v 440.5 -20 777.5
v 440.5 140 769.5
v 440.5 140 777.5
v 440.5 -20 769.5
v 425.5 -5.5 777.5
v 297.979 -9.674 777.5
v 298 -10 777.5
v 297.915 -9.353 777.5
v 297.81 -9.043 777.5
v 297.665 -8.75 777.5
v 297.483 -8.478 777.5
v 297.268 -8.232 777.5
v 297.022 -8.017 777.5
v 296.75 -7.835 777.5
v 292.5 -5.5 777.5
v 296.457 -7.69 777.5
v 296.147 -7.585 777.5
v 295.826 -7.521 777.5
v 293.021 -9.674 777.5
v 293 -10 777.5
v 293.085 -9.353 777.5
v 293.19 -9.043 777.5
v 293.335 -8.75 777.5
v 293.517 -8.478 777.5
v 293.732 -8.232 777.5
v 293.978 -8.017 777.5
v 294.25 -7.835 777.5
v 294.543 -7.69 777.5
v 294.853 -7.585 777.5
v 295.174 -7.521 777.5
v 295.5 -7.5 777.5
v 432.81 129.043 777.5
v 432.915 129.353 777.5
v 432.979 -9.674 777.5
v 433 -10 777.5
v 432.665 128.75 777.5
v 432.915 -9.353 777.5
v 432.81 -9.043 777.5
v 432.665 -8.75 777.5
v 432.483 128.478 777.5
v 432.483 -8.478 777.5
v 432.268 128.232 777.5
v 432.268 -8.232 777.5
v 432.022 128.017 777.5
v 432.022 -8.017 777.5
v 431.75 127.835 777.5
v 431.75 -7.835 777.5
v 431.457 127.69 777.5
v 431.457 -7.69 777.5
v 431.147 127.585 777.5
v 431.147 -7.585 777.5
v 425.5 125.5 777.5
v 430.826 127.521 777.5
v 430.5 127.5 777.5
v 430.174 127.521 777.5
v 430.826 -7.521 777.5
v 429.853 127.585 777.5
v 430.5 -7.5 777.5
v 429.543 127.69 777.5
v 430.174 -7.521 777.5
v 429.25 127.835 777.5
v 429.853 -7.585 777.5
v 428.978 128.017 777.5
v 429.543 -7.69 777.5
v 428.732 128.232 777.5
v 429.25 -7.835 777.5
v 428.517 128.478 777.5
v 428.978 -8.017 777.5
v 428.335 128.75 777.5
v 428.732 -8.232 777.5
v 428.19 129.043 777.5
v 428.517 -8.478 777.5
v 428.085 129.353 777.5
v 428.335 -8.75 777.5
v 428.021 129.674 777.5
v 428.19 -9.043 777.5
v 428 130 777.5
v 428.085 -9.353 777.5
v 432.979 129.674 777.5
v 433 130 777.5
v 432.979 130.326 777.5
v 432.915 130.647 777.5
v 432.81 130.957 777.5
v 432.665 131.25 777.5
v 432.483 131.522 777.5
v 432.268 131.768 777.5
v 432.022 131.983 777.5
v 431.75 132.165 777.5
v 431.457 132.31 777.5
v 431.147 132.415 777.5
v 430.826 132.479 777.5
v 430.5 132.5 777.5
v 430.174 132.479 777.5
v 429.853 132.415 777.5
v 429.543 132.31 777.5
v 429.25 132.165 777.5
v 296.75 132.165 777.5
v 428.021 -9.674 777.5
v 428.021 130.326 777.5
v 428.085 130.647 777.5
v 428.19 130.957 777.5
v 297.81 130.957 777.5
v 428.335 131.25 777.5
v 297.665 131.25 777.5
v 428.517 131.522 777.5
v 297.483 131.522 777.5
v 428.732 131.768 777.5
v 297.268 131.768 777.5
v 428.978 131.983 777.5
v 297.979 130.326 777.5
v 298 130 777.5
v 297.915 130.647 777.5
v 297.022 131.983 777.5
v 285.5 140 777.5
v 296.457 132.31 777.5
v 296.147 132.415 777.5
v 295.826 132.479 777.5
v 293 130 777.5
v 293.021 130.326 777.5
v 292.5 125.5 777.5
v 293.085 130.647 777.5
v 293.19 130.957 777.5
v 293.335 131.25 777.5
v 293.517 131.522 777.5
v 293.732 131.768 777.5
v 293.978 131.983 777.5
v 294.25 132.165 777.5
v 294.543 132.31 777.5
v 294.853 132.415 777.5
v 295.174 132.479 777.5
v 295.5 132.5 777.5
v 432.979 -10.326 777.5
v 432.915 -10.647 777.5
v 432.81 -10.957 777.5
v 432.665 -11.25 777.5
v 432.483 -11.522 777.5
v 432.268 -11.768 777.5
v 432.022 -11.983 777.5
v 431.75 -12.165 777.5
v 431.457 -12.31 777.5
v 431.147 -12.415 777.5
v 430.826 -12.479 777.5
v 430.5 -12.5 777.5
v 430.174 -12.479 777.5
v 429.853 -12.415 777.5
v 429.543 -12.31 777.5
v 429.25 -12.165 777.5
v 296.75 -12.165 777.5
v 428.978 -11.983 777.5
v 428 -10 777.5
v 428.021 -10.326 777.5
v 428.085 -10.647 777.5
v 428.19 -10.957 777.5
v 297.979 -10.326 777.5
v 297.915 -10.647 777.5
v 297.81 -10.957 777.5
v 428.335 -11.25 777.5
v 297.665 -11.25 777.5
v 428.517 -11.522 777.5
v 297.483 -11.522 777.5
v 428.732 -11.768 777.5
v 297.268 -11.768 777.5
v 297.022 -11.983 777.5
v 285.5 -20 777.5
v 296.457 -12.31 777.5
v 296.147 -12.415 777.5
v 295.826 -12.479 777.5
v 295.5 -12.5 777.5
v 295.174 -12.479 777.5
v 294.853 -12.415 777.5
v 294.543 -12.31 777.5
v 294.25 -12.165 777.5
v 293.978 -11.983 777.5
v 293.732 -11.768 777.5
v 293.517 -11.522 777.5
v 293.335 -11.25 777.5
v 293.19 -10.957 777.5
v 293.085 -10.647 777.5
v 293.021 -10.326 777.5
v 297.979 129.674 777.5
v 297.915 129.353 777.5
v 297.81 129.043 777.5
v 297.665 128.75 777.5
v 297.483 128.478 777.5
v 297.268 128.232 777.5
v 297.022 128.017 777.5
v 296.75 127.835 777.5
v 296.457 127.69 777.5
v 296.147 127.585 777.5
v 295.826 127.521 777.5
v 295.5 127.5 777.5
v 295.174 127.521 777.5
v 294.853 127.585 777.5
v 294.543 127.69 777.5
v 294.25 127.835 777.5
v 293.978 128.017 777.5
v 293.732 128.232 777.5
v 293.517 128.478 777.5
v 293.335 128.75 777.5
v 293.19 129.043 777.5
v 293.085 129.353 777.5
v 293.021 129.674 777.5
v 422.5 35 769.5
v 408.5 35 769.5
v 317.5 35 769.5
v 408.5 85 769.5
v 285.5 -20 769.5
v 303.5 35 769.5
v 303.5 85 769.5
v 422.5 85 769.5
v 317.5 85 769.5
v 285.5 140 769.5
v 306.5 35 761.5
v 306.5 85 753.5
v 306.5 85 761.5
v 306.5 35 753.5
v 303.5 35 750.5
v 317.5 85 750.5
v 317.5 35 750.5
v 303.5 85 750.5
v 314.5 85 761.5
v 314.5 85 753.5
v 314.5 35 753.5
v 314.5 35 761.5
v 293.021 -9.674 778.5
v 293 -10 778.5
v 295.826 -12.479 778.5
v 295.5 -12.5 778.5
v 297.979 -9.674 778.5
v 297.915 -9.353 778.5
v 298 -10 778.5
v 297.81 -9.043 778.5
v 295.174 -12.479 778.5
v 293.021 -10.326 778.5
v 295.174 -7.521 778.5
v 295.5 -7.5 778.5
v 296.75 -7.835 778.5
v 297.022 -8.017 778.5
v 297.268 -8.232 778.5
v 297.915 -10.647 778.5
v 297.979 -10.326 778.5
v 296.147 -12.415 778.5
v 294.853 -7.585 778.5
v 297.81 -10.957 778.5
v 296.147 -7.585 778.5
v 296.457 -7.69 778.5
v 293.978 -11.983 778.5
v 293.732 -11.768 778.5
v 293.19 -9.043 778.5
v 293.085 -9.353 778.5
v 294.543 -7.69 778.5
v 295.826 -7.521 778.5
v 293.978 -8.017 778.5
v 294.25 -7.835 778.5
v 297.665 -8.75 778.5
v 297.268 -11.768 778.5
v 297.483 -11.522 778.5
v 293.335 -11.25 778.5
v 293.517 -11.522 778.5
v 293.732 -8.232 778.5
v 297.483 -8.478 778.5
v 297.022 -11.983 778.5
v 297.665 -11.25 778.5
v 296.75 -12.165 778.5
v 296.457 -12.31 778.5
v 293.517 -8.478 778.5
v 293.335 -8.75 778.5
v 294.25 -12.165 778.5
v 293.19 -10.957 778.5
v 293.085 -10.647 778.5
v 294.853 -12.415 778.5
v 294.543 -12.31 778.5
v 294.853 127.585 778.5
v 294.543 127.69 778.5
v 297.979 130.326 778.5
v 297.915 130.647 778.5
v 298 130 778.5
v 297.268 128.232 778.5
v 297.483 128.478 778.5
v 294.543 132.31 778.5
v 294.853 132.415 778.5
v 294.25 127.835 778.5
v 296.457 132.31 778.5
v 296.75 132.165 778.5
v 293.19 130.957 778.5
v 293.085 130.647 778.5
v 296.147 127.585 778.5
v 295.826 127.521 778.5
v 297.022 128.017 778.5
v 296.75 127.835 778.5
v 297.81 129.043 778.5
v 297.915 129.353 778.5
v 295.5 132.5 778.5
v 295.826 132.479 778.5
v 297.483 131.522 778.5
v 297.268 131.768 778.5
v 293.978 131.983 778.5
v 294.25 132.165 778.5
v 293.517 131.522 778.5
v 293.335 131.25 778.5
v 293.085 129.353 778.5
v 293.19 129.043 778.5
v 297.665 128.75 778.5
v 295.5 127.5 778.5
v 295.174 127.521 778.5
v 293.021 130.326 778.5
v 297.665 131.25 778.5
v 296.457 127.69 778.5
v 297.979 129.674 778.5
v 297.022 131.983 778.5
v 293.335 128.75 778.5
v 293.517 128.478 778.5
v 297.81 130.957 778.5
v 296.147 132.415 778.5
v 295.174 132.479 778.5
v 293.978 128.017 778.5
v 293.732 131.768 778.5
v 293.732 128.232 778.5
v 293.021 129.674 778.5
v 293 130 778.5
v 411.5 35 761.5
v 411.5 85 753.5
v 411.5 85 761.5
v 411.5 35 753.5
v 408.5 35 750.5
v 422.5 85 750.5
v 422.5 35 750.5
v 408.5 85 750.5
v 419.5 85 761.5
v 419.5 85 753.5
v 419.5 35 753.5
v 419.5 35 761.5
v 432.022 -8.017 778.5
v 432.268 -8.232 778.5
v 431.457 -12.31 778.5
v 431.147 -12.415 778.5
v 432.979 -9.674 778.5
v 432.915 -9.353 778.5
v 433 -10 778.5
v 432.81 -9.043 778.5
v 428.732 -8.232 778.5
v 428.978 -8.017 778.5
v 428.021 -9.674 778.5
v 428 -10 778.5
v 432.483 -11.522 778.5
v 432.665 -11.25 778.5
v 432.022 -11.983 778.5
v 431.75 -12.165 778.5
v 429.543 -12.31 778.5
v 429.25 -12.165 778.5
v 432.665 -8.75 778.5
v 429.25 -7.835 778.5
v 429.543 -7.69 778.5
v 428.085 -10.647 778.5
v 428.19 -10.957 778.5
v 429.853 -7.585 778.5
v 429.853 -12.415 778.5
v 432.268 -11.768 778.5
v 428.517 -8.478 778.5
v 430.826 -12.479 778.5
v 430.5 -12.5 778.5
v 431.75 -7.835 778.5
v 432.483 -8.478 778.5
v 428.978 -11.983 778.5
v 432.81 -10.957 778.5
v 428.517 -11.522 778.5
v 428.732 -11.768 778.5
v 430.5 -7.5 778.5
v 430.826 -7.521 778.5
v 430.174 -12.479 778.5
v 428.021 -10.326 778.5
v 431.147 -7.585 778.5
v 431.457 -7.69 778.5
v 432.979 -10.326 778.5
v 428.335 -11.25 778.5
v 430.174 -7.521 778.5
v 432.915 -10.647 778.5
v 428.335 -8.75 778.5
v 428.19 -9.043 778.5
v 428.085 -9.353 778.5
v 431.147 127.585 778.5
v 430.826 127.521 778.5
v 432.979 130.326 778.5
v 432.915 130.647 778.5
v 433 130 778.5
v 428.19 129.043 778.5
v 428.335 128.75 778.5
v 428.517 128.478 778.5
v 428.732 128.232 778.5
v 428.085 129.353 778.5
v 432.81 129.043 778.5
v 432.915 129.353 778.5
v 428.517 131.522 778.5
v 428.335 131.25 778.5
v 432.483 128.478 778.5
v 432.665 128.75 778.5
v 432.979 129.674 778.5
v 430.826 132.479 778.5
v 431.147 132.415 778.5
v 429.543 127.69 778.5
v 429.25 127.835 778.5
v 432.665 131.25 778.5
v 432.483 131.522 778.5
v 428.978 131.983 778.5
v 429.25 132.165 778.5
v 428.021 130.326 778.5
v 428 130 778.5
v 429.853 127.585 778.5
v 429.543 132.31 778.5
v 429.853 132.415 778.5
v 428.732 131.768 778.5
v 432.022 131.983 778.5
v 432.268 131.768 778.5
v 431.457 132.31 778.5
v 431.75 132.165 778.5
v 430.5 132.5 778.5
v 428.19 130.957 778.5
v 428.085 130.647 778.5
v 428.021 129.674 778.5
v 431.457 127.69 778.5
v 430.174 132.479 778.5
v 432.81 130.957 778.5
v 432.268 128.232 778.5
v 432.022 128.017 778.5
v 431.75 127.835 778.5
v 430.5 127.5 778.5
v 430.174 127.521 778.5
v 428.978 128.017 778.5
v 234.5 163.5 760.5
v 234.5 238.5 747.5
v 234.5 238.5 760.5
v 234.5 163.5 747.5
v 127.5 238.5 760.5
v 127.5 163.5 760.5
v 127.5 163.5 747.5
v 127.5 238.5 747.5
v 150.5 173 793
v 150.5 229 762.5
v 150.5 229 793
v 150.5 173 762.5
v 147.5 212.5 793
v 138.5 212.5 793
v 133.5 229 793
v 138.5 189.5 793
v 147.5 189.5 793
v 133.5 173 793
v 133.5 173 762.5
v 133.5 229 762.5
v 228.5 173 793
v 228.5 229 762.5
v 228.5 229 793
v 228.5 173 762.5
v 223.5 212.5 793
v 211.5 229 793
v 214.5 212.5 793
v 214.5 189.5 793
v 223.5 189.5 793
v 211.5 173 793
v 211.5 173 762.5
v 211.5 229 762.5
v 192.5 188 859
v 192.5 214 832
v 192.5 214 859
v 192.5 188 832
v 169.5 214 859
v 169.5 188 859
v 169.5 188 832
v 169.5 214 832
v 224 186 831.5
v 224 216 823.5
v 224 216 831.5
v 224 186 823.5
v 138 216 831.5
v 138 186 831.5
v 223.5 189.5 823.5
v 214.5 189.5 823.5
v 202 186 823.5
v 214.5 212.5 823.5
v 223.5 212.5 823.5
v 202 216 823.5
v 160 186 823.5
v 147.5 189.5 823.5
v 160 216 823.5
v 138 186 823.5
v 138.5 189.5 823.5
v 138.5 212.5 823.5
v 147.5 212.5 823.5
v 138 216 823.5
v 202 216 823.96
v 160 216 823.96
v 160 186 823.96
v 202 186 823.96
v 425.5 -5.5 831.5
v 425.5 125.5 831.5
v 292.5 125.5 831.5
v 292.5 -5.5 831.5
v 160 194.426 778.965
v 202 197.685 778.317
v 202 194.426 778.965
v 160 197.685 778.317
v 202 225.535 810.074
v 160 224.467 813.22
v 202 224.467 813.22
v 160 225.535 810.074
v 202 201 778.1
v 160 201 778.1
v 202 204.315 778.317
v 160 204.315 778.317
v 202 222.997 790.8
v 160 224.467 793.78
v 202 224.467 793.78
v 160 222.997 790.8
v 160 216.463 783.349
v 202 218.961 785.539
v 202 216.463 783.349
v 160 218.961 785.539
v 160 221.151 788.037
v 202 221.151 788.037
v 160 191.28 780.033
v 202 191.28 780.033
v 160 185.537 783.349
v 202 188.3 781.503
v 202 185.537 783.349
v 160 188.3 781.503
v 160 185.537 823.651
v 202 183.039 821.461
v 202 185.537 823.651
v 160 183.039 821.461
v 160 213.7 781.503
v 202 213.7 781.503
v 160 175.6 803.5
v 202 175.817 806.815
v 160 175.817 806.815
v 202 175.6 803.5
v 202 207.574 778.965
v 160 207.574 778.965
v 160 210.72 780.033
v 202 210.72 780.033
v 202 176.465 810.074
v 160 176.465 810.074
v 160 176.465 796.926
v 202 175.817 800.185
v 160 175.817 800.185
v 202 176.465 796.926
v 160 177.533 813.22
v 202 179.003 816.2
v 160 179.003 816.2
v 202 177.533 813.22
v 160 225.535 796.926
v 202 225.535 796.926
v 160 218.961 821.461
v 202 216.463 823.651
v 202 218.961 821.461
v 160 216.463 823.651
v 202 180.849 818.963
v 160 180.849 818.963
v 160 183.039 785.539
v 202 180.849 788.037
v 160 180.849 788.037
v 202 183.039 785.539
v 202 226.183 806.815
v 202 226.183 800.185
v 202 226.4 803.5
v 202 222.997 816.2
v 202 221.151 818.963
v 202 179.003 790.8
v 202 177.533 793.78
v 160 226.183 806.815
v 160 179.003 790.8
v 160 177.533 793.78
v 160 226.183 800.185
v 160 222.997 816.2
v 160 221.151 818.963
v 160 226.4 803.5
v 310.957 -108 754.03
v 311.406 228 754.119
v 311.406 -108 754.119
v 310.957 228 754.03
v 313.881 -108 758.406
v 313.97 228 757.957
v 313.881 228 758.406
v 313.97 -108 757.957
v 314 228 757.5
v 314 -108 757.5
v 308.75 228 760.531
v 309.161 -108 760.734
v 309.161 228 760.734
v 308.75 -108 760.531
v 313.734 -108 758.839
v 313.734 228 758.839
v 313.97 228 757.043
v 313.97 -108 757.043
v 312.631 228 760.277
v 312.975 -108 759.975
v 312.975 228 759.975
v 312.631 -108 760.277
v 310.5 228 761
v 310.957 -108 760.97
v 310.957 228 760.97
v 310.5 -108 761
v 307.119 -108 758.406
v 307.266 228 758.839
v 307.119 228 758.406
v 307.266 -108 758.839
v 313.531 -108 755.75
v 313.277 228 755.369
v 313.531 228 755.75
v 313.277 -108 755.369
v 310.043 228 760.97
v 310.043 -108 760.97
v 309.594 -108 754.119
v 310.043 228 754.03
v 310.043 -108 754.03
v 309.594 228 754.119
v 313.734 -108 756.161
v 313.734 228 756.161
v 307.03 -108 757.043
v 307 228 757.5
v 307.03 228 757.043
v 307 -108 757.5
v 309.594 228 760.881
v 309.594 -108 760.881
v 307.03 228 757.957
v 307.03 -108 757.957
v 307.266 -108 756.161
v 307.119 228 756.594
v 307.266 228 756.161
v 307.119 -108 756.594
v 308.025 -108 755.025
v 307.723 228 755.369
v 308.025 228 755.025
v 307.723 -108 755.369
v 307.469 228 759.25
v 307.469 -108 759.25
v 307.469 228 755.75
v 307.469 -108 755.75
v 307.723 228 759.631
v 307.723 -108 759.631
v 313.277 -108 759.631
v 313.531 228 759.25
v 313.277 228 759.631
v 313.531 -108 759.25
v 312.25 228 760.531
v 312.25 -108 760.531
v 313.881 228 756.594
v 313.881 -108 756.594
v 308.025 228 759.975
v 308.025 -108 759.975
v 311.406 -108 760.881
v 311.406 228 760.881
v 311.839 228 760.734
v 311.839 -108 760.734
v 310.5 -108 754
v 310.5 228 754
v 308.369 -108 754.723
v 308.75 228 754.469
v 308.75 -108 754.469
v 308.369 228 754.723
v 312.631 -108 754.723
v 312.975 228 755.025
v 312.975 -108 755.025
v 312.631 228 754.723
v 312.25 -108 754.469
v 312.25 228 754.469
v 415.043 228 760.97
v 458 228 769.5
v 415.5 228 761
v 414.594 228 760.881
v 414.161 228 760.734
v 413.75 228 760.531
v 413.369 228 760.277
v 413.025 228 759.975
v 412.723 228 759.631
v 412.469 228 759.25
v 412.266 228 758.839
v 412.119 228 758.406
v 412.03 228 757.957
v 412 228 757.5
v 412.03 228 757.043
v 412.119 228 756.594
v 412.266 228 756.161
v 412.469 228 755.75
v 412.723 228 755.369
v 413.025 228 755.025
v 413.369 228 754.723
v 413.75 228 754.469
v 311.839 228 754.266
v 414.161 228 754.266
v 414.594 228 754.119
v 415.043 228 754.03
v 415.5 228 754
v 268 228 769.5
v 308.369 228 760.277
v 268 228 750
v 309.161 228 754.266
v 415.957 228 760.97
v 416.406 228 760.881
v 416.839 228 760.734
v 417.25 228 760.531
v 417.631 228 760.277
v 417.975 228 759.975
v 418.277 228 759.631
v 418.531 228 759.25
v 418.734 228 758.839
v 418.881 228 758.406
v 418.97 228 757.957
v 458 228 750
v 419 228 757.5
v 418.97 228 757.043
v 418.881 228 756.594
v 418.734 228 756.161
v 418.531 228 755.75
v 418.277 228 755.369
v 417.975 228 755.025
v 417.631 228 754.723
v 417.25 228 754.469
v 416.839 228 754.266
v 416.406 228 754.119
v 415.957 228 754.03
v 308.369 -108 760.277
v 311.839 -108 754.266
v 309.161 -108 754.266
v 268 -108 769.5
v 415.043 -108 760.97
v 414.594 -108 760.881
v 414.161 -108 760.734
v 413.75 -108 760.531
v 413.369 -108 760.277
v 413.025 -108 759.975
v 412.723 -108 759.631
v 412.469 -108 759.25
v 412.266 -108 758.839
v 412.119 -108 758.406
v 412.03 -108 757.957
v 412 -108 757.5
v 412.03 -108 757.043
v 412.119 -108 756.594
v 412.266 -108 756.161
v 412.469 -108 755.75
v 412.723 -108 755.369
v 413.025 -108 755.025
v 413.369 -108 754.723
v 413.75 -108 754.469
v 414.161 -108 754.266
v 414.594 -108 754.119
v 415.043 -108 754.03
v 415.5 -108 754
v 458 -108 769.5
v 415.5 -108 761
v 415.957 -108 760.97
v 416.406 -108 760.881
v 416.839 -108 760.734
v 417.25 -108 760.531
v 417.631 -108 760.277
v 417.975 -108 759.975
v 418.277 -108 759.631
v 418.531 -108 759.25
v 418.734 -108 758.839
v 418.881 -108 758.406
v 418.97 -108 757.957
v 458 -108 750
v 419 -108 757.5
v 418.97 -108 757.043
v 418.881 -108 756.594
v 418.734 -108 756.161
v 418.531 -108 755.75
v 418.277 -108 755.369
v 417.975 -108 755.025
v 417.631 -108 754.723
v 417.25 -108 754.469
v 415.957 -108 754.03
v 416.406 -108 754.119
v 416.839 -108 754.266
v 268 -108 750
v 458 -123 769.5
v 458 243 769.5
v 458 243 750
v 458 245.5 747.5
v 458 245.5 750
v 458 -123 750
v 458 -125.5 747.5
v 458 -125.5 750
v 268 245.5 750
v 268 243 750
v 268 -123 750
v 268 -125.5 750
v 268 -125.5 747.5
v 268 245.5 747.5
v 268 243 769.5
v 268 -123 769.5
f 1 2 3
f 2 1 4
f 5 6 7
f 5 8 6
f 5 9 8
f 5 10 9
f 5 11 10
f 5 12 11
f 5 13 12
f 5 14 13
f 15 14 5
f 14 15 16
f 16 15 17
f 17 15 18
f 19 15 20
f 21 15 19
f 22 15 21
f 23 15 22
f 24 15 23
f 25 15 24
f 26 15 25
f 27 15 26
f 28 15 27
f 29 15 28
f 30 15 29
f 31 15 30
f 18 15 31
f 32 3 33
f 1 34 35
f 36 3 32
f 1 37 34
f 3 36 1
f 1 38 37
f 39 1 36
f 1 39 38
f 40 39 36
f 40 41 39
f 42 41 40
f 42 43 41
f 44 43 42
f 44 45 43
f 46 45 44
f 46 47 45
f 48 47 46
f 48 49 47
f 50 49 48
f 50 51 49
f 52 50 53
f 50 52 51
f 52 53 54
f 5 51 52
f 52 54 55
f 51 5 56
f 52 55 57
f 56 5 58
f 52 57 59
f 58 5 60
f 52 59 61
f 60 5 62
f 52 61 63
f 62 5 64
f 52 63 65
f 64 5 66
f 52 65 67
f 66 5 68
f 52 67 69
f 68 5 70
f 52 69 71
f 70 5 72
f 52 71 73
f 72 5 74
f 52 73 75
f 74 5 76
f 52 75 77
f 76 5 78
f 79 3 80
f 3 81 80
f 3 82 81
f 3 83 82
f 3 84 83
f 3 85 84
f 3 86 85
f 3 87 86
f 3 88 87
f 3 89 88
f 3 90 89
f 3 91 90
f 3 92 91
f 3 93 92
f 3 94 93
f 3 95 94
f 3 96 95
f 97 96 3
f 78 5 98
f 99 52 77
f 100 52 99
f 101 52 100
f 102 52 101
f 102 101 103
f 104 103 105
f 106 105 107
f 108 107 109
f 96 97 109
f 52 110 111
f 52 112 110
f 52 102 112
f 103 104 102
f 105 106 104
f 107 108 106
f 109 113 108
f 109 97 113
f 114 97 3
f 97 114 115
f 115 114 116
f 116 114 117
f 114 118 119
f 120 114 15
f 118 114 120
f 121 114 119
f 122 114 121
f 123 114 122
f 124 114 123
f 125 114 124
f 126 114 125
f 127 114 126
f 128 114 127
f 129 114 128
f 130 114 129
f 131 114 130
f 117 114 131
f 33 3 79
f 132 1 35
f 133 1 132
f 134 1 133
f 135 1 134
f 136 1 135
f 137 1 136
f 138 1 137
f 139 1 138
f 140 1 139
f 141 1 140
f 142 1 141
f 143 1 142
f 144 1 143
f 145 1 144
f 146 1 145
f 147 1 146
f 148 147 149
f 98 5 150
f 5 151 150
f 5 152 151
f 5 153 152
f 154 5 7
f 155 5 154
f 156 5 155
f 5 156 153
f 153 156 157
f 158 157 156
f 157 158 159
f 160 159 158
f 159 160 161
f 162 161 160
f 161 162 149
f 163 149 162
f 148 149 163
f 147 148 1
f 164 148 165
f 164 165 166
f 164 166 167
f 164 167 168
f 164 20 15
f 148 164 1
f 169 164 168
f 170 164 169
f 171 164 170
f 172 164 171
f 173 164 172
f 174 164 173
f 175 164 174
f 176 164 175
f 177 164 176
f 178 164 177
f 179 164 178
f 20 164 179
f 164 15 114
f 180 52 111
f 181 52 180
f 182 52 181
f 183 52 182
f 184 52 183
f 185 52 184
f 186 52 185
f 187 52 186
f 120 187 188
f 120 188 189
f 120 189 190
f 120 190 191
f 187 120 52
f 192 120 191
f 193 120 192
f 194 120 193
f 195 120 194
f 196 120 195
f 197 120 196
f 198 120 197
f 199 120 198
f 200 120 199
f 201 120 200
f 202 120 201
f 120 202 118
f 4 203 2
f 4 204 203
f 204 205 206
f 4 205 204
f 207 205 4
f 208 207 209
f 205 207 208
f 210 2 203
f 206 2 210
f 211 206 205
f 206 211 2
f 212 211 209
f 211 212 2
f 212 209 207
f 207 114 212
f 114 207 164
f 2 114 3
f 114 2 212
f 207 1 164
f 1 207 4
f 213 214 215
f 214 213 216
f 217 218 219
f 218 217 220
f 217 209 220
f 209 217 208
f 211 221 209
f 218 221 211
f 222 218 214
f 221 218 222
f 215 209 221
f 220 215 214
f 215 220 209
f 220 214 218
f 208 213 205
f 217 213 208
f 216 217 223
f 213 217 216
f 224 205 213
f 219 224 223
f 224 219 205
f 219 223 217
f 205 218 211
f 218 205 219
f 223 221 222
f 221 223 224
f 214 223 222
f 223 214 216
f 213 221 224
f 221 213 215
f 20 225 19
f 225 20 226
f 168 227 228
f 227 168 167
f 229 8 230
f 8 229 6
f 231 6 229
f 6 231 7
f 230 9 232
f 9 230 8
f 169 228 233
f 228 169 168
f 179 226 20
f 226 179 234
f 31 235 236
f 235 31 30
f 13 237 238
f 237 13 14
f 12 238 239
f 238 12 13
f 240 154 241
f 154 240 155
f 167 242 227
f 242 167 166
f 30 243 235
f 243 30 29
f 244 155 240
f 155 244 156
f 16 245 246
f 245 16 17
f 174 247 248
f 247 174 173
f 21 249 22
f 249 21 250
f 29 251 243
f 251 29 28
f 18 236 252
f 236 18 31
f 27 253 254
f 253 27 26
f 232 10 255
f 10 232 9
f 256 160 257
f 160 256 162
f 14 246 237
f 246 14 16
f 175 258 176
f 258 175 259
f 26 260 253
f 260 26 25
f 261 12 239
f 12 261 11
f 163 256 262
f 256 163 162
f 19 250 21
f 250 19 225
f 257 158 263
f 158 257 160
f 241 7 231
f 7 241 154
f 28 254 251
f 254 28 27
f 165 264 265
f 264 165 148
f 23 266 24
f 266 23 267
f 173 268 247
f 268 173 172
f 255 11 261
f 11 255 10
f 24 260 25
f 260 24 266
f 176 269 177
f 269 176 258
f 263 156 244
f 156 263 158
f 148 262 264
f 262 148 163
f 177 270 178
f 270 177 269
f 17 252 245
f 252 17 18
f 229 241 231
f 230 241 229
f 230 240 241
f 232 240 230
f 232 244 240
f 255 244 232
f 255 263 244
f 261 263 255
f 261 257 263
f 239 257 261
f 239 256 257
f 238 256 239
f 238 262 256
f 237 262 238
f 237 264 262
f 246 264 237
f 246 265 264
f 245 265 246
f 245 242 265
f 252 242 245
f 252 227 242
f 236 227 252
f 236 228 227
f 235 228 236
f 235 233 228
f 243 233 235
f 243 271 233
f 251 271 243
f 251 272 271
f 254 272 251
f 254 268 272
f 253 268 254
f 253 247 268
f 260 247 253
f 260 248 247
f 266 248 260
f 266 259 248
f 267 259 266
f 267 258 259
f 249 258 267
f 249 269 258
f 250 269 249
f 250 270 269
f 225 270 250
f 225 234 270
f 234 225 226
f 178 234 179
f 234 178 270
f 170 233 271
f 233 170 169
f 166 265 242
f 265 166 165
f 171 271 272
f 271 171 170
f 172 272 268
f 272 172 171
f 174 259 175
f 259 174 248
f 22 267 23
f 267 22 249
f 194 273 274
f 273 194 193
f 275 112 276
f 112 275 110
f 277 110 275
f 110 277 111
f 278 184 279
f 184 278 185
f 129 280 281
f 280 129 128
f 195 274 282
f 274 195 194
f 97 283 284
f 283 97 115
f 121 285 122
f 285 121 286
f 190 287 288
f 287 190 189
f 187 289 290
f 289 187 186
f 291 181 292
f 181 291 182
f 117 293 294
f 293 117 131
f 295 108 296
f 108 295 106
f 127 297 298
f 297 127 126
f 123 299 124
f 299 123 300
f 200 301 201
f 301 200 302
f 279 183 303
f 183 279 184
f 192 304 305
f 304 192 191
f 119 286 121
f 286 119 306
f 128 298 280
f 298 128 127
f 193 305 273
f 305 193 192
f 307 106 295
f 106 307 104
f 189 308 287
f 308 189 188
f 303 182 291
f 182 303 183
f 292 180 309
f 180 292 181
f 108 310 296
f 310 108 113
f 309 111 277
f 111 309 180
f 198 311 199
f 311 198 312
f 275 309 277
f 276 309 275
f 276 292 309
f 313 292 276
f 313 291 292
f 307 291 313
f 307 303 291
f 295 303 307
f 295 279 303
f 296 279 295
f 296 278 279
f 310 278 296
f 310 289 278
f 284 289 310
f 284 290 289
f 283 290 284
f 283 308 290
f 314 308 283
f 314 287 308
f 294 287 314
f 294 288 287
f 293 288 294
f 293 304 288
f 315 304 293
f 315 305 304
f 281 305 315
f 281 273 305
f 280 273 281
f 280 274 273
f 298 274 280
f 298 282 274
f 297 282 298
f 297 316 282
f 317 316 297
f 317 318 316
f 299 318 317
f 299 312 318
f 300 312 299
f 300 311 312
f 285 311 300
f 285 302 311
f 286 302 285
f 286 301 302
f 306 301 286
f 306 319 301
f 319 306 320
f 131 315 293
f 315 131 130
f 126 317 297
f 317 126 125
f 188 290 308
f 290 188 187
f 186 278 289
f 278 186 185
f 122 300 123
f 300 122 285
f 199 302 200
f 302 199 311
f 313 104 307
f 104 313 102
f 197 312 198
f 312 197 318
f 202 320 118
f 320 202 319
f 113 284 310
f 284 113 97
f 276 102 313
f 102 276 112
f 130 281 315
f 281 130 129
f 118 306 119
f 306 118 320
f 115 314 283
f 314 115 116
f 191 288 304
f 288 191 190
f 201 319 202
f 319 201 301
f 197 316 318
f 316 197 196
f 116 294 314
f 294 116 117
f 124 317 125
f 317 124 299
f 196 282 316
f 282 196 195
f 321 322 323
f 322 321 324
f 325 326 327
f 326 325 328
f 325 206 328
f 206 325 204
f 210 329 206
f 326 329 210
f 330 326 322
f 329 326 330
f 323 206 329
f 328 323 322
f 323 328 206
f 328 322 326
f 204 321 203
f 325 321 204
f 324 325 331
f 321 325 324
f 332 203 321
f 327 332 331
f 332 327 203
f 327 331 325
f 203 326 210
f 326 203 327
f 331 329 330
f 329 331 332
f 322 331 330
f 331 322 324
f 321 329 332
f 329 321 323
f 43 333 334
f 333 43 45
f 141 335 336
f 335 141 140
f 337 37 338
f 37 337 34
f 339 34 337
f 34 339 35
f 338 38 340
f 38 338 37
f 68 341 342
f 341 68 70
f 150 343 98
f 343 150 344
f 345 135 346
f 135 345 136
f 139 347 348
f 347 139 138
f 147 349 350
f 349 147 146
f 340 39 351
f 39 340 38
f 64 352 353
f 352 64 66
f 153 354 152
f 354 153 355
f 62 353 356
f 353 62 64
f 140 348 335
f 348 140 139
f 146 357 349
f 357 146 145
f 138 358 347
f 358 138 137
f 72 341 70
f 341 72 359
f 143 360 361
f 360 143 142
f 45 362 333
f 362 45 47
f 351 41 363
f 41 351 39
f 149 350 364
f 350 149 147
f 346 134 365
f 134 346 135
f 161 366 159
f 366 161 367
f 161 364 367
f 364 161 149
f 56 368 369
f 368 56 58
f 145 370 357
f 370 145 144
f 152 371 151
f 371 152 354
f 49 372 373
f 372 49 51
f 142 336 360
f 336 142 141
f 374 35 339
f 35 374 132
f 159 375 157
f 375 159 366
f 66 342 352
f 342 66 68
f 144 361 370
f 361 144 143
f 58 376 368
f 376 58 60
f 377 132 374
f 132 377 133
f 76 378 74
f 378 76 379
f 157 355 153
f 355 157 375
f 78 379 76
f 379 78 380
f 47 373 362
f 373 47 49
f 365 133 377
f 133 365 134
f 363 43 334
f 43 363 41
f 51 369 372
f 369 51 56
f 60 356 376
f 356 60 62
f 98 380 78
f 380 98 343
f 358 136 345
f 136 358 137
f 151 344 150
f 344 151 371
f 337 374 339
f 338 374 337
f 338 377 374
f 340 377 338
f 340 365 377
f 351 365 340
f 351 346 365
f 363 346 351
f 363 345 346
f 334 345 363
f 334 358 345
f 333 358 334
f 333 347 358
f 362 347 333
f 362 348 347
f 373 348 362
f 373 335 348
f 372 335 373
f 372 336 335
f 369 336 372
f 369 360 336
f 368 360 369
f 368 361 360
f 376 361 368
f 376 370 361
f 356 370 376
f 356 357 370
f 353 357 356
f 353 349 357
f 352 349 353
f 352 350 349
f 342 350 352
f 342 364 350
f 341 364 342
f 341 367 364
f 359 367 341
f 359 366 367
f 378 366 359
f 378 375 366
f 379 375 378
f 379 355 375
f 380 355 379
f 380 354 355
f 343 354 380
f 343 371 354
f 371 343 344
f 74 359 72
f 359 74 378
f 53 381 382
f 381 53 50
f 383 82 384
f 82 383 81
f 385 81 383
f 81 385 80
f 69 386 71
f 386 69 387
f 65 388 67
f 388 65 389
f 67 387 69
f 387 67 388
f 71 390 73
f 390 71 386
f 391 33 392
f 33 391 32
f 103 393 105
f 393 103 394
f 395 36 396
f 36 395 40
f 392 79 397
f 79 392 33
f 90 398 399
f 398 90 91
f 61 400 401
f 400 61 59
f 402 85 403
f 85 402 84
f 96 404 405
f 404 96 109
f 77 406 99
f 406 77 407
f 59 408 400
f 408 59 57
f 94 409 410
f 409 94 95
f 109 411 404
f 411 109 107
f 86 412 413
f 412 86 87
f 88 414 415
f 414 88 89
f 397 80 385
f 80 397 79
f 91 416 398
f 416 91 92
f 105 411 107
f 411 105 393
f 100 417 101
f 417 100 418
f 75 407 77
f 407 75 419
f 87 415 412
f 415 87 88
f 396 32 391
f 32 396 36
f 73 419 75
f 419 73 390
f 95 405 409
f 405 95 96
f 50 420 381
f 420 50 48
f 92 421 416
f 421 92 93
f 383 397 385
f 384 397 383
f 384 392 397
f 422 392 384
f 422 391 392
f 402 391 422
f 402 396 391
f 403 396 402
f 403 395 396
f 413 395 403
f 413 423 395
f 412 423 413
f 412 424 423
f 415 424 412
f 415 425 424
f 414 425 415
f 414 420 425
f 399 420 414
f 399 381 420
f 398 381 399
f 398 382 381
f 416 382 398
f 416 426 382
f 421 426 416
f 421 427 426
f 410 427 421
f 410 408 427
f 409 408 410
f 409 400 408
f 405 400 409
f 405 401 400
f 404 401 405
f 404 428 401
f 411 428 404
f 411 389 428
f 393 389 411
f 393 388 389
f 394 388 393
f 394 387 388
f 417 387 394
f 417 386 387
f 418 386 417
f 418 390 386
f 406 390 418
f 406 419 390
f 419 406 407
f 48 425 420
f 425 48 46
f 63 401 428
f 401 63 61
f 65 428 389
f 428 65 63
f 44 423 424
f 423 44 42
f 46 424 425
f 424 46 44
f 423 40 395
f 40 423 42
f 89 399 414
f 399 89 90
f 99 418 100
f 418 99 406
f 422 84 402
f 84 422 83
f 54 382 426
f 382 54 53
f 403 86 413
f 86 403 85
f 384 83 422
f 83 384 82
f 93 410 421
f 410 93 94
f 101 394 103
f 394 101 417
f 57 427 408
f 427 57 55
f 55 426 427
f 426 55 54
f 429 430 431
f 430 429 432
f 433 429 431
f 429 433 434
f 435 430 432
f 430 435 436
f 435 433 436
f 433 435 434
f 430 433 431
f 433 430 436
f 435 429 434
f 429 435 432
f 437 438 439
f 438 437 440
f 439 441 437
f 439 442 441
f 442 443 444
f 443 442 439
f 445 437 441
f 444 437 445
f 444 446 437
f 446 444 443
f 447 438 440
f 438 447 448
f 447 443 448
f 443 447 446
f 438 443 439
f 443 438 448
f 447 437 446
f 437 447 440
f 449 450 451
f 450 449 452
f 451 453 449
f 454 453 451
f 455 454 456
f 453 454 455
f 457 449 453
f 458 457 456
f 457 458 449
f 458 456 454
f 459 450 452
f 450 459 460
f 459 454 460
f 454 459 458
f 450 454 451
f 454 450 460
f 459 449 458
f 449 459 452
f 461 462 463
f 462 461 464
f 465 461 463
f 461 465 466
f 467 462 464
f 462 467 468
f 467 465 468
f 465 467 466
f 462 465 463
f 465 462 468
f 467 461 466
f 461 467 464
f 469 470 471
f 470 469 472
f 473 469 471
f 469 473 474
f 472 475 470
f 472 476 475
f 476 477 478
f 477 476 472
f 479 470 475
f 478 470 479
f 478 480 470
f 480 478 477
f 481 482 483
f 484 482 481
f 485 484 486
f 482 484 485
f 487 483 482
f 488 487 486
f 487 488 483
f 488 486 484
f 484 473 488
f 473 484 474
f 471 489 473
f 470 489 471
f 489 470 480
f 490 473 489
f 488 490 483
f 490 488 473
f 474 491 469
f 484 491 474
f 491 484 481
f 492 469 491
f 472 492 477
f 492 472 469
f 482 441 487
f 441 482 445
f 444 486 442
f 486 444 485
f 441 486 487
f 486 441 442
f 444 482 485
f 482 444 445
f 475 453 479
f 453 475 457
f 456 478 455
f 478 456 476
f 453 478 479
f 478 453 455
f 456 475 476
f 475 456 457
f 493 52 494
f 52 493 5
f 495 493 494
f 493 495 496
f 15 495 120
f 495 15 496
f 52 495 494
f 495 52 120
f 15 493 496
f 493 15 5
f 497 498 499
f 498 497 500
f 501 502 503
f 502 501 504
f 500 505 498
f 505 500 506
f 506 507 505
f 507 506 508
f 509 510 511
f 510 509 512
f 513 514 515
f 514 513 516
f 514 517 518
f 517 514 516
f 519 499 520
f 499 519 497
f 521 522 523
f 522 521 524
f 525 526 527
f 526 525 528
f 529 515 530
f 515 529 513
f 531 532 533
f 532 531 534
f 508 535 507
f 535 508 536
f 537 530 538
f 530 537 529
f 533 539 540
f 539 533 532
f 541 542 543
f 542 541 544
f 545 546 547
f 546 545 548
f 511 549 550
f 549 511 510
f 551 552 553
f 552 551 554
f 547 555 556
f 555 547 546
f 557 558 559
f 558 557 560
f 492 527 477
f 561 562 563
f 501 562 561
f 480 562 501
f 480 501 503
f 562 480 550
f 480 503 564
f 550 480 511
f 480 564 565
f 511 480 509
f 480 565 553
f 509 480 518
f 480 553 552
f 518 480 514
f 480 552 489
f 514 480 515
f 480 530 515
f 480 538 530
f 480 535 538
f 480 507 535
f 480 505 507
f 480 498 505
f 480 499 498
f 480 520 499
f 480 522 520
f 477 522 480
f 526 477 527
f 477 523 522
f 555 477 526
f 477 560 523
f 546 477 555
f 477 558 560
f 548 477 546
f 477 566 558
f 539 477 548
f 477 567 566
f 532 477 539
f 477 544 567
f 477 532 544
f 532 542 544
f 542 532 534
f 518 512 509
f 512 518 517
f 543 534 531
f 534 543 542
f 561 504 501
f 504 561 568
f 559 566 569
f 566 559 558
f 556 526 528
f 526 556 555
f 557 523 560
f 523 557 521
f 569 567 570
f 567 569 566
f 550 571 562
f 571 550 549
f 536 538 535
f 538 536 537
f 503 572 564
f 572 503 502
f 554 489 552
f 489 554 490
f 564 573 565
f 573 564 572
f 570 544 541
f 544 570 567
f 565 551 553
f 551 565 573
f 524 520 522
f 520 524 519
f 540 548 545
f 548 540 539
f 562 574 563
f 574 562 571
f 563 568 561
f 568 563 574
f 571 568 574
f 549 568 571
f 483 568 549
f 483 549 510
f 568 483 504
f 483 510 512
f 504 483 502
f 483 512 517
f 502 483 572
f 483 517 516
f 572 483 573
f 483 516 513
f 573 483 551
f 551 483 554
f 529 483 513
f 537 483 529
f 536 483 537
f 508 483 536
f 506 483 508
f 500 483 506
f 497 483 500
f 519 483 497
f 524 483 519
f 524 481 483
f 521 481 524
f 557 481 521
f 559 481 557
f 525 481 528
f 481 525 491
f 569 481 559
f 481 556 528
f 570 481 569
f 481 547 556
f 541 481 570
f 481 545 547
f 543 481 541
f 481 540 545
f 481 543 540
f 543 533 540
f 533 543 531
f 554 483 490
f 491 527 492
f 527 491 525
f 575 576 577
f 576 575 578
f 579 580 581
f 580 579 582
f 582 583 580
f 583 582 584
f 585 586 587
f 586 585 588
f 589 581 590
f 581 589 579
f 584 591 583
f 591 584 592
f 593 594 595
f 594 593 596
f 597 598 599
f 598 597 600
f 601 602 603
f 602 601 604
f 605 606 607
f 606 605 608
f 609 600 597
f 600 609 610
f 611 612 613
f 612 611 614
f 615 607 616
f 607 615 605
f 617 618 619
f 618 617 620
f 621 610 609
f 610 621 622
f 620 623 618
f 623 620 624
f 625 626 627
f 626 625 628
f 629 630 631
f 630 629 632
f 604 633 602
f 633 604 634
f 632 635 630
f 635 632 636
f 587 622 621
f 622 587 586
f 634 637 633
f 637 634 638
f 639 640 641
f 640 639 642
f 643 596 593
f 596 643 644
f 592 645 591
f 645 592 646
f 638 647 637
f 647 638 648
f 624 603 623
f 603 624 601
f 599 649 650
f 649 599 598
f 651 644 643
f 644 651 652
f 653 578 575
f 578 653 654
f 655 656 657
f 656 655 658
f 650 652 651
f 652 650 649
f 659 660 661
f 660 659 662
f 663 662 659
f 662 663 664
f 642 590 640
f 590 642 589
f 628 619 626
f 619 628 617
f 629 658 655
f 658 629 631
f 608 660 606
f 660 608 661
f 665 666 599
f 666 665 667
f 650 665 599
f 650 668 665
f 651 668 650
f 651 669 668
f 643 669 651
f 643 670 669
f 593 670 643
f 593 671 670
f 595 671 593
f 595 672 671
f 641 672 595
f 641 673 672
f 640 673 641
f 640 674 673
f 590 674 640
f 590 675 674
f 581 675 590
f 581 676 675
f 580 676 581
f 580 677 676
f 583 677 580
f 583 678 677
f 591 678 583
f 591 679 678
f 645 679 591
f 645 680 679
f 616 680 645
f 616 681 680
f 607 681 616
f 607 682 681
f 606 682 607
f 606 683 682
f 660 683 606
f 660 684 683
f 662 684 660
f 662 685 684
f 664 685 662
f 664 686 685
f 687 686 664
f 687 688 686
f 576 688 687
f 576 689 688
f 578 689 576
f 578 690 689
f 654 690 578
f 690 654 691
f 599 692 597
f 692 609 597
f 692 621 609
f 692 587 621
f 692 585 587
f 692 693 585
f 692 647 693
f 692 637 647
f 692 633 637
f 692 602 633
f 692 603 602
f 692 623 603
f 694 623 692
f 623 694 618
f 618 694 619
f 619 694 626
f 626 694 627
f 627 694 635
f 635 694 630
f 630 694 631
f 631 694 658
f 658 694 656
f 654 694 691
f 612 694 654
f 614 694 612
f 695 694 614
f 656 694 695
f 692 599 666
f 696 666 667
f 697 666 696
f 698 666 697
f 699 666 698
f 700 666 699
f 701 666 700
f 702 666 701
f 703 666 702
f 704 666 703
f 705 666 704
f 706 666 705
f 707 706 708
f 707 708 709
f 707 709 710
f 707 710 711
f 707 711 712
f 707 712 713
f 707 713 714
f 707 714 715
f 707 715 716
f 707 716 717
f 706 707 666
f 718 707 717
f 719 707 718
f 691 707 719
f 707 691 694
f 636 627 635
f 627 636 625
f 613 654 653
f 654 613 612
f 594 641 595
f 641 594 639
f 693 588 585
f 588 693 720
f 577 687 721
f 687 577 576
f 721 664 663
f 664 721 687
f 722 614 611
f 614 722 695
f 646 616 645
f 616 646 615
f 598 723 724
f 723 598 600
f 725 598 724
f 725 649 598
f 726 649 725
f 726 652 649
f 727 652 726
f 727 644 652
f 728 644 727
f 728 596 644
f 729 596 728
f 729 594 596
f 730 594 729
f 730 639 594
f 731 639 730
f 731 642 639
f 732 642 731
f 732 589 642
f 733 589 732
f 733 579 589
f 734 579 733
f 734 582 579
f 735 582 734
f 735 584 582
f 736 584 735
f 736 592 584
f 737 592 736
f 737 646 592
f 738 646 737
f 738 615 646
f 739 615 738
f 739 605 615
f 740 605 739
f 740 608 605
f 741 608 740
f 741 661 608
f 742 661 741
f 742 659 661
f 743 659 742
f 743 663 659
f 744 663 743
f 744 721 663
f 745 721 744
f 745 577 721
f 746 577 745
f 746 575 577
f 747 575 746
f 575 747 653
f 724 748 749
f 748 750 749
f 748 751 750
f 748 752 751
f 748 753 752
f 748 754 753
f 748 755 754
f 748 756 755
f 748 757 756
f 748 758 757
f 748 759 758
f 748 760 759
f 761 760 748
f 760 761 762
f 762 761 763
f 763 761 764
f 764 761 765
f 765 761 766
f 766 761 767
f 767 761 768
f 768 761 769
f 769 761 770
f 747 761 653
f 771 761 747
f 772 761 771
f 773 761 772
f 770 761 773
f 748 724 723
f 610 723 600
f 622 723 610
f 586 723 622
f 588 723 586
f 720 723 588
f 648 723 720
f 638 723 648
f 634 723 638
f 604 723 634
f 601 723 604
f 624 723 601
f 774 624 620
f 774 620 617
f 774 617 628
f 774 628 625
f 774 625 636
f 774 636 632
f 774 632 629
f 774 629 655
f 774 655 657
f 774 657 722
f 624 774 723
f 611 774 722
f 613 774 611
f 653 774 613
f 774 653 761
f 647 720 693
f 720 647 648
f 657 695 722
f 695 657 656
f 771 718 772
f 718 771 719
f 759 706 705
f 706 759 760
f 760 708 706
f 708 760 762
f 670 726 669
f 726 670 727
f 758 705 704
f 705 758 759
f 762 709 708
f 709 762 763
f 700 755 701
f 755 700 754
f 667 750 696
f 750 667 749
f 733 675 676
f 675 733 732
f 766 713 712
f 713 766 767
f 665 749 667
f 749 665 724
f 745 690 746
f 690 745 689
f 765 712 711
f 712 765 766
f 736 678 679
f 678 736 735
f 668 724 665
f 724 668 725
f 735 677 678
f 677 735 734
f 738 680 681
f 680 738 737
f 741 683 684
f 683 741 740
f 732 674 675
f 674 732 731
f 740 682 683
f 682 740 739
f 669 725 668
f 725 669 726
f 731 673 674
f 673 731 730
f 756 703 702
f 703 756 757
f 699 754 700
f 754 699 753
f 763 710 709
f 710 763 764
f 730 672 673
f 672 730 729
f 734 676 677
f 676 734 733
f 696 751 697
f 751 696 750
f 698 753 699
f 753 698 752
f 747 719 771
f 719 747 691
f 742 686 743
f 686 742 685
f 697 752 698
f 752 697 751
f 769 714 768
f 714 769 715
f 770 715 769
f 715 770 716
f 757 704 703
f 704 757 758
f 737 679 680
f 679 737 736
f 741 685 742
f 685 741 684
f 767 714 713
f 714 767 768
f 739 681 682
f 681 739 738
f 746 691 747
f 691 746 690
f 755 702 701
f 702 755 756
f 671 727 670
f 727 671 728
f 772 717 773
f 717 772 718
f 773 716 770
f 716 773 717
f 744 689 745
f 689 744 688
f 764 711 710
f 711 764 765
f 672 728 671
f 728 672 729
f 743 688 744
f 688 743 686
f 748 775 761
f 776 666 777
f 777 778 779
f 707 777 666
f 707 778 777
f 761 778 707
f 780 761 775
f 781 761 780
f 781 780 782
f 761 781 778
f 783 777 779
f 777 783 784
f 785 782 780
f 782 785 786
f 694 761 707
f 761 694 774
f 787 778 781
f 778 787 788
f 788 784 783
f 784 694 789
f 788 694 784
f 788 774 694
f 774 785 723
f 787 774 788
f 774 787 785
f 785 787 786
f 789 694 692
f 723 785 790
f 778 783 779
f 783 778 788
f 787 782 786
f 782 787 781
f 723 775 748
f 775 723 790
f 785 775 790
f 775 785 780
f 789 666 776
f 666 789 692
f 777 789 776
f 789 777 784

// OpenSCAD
// Millimetre geometric reference; use real functional tools, not printed heated or cutting equipment.
// Source SHA-256: 557c3e71fa862d0f59774b9e9199c600353eeb77178381039d288e899a6e2241
$fn=48;
module carton_carriage(){
translate([0, 0, 11]) rotate([0, 0, 0]) cube([155, 160, 8],center=true);
translate([-58, 0, -5]) rotate([0, 0, 0]) cube([3, 50, 14],center=true);
translate([-47, 0, -5]) rotate([0, 0, 0]) cube([3, 50, 14],center=true);
translate([-52.5, 0, -10.5]) rotate([0, 0, 0]) cube([8, 50, 3],center=true);
translate([-52.5, 0, 0.5]) rotate([0, 0, 0]) cube([8, 50, 3],center=true);
translate([-52.5, 0, 4.5]) rotate([0, 0, 0]) cube([14, 50, 6],center=true);
translate([-67.5, -70, 15.5]) rotate([0, 0, 0]) cylinder(r=2.5,h=1,center=true);
translate([-67.5, 70, 15.5]) rotate([0, 0, 0]) cylinder(r=2.5,h=1,center=true);
translate([47, 0, -5]) rotate([0, 0, 0]) cube([3, 50, 14],center=true);
translate([58, 0, -5]) rotate([0, 0, 0]) cube([3, 50, 14],center=true);
translate([52.5, 0, -10.5]) rotate([0, 0, 0]) cube([8, 50, 3],center=true);
translate([52.5, 0, 0.5]) rotate([0, 0, 0]) cube([8, 50, 3],center=true);
translate([52.5, 0, 4.5]) rotate([0, 0, 0]) cube([14, 50, 6],center=true);
translate([67.5, -70, 15.5]) rotate([0, 0, 0]) cylinder(r=2.5,h=1,center=true);
translate([67.5, 70, 15.5]) rotate([0, 0, 0]) cylinder(r=2.5,h=1,center=true);
}
module carton(){
translate([0, 0, 0]) rotate([0, 0, 0]) cube([133, 131, 54],center=true);
}
module coder_rest(){
translate([0, 0, 0]) rotate([0, 0, 0]) cube([107, 75, 13],center=true);
translate([-39, 0, 23.75]) rotate([0, 0, 0]) cube([17, 56, 30.5],center=true);
translate([39, 0, 23.75]) rotate([0, 0, 0]) cube([17, 56, 30.5],center=true);
}
module coder_handle(){
translate([0, 0, 17]) rotate([0, 0, 0]) cube([23, 26, 27],center=true);
translate([0, 0, -1]) rotate([0, 0, 0]) cube([86, 30, 8],center=true);
translate([-38, 0, -17]) rotate([0, 0, 0]) cube([9, 23, 37],center=true);
translate([38, 0, -17]) rotate([0, 0, 0]) cube([9, 23, 37],center=true);
translate([-38, 0, -25]) rotate([0, 0, 0]) rotate([0,90,0]) cylinder(r=5,h=8,center=true);
translate([38, 0, -25]) rotate([0, 0, 0]) rotate([0,90,0]) cylinder(r=5,h=8,center=true);
}
module print_wheel(){
translate([0, 0, 0]) rotate([0, 0, 0]) rotate([0,90,0]) cylinder(r=25.4,h=42,center=true);
}
module carton_carriage_rail_left(){
translate([0, 0, 0]) rotate([0, 0, 0]) rotate([90,0,0]) cylinder(r=3.5,h=336,center=true);
}
module carton_carriage_rail_right(){
translate([0, 0, 0]) rotate([0, 0, 0]) rotate([90,0,0]) cylinder(r=3.5,h=336,center=true);
}
module carton_carriage_base(){
translate([0, 0, 0]) rotate([0, 0, 0]) cube([190, 371, 2.5],center=true);
}
module carton_carriage_end_front(){
translate([0, 0, 0]) rotate([0, 0, 0]) cube([190, 15, 22],center=true);
}
module carton_carriage_end_back(){
translate([0, 0, 0]) rotate([0, 0, 0]) cube([190, 15, 22],center=true);
}
translate([363, 60, 762.5]) rotate([0,0,0]) carton_carriage();
translate([359, 60, 804.5]) rotate([0,0,0]) carton();
translate([181, 201, 754]) rotate([0,0,0]) coder_rest();
translate([181, 201, 828.5]) rotate([0,0,0]) coder_handle();
translate([181, 201, 803.5]) rotate([0,0,0]) print_wheel();
translate([310.5, 60, 757.5]) rotate([0,0,0]) carton_carriage_rail_left();
translate([415.5, 60, 757.5]) rotate([0,0,0]) carton_carriage_rail_right();
translate([363, 60, 748.75]) rotate([0,0,0]) carton_carriage_base();
translate([363, -115.5, 758.5]) rotate([0,0,0]) carton_carriage_end_front();
translate([363, 235.5, 758.5]) rotate([0,0,0]) carton_carriage_end_back();
